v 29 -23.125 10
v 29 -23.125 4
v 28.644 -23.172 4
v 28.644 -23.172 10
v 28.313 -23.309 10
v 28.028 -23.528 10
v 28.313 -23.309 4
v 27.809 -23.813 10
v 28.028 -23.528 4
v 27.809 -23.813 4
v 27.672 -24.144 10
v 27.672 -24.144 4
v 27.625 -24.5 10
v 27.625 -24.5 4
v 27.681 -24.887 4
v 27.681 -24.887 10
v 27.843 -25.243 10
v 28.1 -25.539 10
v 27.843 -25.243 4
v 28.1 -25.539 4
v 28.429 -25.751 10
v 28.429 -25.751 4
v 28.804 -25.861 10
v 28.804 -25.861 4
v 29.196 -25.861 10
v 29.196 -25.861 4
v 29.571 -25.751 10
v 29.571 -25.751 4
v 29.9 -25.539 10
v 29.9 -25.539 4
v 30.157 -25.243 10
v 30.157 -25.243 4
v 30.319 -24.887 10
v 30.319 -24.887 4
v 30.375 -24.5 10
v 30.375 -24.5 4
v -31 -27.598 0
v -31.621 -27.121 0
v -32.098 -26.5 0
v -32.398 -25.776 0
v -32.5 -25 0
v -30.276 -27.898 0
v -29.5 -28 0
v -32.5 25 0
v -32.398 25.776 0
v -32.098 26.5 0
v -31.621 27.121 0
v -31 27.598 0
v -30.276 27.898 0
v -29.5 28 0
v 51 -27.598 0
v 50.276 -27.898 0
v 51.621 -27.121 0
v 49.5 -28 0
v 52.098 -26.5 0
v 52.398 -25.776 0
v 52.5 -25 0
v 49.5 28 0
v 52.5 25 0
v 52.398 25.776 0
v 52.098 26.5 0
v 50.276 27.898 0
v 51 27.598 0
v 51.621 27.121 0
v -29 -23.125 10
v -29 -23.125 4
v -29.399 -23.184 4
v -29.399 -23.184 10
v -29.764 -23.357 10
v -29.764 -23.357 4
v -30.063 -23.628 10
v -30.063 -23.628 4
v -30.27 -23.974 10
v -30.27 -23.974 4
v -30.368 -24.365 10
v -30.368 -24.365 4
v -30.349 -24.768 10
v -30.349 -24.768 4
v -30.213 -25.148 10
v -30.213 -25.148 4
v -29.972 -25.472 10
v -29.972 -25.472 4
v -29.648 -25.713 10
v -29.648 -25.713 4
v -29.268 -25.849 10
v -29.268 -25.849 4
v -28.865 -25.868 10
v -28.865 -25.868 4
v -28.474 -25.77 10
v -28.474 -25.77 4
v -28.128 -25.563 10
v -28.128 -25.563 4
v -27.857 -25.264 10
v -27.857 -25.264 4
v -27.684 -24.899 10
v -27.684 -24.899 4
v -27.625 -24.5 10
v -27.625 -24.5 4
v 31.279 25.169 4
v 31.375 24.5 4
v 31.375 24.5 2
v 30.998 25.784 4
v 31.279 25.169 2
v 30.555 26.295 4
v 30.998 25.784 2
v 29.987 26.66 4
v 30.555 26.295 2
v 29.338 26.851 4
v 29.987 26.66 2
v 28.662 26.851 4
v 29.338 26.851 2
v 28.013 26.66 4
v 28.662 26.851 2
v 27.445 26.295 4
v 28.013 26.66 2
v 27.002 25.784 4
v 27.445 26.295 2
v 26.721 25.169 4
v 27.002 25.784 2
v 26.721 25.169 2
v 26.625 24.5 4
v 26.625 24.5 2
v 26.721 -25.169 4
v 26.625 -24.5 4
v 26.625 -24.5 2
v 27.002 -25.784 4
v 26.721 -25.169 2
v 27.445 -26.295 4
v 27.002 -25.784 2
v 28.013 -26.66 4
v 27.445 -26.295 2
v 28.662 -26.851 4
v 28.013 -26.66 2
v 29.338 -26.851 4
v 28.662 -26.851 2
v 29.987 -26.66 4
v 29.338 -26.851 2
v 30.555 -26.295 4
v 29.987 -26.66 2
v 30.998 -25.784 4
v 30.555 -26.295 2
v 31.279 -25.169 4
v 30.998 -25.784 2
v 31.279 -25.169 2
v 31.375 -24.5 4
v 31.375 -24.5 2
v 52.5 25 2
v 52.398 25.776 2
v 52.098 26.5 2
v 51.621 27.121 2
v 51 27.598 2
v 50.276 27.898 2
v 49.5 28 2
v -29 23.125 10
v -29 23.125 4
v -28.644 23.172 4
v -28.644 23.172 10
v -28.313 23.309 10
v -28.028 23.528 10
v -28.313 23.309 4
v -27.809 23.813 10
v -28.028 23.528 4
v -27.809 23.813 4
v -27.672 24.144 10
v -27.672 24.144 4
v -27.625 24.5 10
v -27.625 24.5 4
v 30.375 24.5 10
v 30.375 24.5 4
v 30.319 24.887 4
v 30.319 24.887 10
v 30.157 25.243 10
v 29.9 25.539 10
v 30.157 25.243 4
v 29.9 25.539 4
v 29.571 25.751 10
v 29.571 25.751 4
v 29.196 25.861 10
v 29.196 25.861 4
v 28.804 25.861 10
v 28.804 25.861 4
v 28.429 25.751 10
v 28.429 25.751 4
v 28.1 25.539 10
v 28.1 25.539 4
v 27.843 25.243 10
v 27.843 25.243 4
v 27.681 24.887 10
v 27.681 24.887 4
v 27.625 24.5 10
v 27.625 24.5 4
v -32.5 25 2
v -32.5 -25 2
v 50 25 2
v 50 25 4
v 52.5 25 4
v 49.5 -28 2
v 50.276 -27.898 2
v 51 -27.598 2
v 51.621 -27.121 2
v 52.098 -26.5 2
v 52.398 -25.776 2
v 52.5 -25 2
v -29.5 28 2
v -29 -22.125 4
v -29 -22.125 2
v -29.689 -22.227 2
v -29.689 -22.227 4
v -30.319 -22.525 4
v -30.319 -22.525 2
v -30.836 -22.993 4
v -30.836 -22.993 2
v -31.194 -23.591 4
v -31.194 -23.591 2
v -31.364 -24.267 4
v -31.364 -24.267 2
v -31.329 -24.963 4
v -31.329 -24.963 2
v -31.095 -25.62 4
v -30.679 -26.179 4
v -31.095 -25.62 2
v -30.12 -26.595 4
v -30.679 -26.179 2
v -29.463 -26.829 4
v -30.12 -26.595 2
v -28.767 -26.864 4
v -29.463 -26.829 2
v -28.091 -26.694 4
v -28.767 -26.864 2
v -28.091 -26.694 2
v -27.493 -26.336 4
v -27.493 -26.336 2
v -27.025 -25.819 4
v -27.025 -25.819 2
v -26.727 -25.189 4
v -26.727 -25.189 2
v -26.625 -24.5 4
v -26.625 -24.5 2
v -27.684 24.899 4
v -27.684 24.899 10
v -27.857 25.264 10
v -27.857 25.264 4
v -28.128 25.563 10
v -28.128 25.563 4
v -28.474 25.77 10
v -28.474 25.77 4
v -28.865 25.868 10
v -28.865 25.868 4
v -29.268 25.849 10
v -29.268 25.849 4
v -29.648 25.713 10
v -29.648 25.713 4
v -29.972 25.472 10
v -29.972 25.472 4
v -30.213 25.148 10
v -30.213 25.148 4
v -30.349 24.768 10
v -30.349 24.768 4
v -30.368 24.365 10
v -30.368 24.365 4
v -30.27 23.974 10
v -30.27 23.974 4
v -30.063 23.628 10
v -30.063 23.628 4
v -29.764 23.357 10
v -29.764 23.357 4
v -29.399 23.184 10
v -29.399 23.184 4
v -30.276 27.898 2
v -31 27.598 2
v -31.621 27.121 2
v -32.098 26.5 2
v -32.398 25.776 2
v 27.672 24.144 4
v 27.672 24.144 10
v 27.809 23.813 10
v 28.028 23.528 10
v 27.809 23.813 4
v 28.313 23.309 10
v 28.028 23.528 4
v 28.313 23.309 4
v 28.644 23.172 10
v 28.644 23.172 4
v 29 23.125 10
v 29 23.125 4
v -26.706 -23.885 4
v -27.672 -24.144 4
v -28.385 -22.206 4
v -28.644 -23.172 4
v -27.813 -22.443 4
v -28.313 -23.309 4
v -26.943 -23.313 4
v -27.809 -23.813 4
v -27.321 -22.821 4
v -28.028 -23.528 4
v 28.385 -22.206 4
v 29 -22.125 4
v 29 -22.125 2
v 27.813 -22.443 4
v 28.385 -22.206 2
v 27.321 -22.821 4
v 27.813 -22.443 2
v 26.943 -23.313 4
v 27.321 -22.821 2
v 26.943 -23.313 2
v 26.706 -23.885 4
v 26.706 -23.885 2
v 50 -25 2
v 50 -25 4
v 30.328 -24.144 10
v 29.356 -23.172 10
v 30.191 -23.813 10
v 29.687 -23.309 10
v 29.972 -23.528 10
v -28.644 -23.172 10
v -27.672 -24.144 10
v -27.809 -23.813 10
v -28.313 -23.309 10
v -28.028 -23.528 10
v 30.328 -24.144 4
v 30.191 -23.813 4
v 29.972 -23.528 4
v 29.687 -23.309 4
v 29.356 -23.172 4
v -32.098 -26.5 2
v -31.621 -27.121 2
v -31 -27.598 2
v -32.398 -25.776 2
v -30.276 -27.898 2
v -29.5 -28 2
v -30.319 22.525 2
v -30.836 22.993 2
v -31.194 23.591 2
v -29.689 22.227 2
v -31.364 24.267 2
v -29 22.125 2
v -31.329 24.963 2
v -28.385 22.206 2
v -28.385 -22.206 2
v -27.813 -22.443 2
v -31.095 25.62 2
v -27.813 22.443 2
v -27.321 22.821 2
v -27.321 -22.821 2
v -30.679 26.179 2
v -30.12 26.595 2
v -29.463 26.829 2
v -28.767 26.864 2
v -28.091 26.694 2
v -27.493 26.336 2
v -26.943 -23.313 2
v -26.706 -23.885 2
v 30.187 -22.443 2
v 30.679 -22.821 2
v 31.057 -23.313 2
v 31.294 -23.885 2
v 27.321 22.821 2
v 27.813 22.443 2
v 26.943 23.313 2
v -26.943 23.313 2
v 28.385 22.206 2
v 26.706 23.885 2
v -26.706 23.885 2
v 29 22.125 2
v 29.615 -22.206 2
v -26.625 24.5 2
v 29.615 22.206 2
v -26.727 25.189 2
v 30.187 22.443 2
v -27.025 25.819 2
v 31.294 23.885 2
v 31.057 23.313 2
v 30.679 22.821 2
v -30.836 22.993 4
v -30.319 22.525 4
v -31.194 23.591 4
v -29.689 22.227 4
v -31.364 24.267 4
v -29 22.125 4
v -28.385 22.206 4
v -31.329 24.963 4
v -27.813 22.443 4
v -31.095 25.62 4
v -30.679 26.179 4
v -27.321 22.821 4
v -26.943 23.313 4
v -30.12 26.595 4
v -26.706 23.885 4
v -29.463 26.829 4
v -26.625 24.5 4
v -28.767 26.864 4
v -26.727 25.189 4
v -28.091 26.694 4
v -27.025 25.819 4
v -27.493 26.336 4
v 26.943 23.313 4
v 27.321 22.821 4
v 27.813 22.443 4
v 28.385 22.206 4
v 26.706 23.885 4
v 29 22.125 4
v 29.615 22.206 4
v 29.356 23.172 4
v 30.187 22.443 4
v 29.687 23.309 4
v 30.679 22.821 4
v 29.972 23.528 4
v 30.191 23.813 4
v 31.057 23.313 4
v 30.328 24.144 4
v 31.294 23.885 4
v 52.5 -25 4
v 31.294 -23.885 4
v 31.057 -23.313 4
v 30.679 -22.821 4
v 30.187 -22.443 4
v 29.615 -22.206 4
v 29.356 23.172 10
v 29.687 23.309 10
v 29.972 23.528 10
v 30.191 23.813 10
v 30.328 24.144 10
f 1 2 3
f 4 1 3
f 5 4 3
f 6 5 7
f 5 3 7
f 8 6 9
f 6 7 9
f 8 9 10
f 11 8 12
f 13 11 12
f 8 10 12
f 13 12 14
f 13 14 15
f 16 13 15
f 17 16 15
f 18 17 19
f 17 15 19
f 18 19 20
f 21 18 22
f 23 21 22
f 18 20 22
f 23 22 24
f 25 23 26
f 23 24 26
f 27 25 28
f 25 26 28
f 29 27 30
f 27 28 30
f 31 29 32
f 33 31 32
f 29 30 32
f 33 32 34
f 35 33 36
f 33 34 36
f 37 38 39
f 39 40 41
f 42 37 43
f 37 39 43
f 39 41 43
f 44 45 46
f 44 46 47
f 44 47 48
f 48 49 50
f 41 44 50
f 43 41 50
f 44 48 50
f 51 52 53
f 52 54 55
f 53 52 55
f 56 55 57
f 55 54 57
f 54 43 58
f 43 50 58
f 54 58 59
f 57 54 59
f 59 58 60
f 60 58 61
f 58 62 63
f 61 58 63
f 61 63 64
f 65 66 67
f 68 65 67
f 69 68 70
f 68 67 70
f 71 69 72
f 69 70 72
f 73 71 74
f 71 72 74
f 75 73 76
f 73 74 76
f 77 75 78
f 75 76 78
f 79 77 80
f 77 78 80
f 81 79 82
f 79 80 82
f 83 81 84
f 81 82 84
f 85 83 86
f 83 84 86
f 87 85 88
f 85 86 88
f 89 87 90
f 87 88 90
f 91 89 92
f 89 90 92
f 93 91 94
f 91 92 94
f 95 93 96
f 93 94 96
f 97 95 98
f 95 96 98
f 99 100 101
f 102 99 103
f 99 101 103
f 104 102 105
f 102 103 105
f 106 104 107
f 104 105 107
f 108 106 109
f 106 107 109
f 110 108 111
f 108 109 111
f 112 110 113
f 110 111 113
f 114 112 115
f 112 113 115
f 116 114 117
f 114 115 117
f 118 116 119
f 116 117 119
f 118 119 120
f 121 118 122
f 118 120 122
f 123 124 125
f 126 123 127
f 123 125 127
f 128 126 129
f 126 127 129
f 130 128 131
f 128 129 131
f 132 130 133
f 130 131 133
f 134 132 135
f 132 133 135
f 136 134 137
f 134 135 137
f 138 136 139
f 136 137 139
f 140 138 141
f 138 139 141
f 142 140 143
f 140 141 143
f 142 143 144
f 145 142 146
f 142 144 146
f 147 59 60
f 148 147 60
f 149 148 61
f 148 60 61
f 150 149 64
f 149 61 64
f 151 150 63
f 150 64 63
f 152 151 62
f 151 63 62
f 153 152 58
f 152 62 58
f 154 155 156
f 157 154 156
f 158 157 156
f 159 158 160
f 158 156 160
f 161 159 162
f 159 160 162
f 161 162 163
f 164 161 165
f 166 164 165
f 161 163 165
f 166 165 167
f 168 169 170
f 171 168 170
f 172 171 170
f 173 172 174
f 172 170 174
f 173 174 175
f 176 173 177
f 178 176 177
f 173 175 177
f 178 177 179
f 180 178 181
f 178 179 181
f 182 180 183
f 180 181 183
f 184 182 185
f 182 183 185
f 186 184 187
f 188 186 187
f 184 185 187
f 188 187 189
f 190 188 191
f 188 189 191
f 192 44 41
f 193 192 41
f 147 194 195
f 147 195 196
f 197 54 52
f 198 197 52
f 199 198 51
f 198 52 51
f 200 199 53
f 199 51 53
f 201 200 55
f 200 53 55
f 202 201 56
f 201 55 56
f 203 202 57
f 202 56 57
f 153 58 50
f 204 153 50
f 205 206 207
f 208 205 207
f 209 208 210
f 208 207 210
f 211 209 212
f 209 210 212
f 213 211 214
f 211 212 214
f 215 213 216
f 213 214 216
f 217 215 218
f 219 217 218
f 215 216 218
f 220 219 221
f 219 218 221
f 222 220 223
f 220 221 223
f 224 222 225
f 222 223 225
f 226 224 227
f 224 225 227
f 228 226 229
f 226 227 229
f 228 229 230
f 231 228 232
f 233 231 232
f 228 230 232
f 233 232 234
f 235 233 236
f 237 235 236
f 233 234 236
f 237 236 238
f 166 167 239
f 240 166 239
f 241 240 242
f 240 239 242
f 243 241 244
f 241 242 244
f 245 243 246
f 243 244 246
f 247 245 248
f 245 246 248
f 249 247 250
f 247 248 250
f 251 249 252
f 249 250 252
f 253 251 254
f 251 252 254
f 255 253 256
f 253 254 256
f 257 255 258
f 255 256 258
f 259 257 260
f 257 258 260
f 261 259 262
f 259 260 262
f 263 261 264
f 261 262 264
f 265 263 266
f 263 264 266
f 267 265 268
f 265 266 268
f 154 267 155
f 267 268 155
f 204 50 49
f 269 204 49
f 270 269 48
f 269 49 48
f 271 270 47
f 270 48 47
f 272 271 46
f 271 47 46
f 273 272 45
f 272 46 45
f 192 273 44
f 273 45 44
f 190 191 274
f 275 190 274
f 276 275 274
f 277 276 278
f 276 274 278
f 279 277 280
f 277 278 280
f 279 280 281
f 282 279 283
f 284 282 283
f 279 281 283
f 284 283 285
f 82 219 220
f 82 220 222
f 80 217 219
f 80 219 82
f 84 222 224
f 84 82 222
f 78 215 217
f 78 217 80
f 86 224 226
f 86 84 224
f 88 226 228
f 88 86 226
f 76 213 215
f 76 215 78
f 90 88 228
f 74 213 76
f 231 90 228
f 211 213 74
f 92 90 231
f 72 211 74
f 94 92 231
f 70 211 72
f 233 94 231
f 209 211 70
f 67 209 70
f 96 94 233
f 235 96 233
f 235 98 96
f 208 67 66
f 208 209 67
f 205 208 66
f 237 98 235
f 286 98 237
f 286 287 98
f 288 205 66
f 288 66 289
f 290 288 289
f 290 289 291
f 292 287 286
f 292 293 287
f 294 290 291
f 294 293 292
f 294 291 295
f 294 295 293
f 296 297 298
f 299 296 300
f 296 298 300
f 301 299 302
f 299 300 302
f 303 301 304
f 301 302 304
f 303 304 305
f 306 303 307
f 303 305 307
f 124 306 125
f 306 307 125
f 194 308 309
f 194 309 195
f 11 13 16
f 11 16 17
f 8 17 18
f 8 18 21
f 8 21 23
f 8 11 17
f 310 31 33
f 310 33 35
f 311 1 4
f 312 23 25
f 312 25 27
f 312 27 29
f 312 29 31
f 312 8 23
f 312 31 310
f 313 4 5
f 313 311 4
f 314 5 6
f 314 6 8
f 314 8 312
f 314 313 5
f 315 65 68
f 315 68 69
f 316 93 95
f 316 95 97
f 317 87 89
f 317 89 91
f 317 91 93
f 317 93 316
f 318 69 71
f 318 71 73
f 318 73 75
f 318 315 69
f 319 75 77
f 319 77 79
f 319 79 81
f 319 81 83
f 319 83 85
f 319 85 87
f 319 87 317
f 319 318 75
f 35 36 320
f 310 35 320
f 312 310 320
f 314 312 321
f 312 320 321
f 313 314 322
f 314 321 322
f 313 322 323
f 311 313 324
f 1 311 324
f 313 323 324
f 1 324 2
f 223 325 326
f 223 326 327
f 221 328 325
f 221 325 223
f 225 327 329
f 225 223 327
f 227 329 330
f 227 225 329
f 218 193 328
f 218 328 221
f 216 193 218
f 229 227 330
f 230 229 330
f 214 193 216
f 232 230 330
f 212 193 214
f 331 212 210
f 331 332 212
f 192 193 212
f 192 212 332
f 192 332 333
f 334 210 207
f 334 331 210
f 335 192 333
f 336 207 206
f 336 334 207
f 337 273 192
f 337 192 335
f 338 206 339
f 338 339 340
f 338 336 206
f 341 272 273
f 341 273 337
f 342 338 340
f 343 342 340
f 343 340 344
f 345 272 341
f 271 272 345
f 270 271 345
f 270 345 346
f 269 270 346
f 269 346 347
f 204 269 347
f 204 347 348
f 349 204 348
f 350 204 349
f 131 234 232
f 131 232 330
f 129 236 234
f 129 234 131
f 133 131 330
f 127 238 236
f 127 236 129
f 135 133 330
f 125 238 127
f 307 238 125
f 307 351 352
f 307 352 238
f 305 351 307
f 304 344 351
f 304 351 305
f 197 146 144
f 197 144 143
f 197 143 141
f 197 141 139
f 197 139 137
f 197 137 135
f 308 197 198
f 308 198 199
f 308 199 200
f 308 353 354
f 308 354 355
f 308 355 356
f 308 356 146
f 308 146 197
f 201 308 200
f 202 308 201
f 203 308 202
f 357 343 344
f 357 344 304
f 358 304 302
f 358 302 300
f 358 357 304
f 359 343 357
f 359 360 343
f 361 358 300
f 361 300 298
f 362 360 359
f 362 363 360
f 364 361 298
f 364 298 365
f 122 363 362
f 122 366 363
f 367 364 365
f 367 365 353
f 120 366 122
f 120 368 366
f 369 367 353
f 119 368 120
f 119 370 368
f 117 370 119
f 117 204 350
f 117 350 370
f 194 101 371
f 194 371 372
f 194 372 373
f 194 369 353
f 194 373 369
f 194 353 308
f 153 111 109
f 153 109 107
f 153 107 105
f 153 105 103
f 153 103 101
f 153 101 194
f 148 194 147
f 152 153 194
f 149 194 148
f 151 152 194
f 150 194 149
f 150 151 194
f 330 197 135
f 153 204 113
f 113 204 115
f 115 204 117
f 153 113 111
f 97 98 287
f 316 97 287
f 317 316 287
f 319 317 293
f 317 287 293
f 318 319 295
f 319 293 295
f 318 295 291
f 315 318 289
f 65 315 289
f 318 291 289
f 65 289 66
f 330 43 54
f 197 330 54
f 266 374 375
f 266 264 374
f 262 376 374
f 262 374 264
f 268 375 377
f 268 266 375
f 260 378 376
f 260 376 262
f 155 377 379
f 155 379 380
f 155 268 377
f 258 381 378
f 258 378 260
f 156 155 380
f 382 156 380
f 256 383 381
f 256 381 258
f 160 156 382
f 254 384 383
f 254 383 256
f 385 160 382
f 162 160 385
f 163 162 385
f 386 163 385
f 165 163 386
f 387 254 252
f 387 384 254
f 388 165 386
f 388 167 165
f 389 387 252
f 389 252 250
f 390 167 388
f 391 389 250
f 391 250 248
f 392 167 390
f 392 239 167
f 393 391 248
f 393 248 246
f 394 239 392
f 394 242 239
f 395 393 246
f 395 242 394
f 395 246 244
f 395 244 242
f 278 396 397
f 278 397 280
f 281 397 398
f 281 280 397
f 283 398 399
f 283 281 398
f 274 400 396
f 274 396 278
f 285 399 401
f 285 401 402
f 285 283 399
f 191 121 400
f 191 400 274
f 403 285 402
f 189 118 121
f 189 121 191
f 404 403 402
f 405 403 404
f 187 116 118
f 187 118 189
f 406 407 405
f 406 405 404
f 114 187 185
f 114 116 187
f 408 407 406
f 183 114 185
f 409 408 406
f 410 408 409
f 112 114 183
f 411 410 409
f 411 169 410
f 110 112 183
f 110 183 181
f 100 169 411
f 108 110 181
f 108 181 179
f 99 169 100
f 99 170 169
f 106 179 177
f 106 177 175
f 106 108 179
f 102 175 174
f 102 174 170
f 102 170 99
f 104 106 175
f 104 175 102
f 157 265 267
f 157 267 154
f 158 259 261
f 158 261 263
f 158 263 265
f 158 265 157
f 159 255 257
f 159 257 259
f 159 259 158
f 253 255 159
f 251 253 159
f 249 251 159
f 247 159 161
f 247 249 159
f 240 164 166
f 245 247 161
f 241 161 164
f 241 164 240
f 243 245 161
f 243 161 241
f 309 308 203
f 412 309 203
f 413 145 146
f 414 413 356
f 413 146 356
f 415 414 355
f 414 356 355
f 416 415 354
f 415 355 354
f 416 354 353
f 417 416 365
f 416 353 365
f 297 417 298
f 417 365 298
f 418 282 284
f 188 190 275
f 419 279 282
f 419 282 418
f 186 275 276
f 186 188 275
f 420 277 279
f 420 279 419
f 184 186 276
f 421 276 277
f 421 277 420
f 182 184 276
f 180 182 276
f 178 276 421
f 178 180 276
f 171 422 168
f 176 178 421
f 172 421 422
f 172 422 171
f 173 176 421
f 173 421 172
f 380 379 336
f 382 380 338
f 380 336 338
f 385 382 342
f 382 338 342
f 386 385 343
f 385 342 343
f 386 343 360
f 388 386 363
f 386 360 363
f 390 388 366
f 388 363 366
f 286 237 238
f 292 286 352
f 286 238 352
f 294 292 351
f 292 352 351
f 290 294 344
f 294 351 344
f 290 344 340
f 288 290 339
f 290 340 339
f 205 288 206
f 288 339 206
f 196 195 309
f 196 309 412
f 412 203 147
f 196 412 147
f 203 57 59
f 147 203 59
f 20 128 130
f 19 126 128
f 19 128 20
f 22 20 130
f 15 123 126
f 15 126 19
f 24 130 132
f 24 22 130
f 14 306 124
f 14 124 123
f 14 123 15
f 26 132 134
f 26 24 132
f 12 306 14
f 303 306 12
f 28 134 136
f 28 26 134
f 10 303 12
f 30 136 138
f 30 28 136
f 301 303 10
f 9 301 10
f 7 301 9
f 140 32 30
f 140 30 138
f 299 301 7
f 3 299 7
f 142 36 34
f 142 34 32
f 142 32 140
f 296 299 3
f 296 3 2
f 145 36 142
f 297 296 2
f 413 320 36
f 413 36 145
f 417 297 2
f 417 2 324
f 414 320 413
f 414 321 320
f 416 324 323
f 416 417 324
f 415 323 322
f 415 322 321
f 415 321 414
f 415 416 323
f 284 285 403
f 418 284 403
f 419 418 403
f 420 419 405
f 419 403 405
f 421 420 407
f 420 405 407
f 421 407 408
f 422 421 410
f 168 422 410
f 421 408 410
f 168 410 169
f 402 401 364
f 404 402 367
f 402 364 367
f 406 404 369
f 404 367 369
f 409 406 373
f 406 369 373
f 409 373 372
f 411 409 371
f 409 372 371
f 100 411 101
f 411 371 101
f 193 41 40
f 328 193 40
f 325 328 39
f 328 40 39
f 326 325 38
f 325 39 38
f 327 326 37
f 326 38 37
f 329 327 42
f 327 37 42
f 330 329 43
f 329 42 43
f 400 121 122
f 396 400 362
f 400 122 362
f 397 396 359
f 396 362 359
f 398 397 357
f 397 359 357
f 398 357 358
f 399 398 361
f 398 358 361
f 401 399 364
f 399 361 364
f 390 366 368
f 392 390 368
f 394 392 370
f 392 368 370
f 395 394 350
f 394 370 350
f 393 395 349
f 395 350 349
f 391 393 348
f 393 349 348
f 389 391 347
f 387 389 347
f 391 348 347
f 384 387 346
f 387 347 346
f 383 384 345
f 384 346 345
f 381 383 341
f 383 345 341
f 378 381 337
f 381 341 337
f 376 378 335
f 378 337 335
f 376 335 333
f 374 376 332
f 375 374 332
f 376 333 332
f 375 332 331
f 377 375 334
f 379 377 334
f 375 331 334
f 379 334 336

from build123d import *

# Parameters (mm, degrees)
F0_W     = 2.5
F0_H     = 50
F1_DEPTH = 2
F2_DEPTH = 4
F3_DEPTH = 4
F4_DEPTH = 10


with BuildPart() as f1:
    # F0 (on Top) → F1 (new body)
    with BuildSketch(Plane.XY):
        with BuildLine():
            ThreePointArc((-32.5, -25), (-31.6213203436, -27.1213203436), (-29.5, -28))
            Line((-29.5, -28), (-29.0716141462, -28))
            Line((-29.0716141462, -28), (49.5, -28))
            ThreePointArc((49.5, -28), (51.6213203436, -27.1213203436), (52.5, -25))
            Line((52.5, -25), (50, -25))
            Line((50, -25), (50, 25))
            Line((50, 25), (52.5, 25))
            ThreePointArc((52.5, 25), (51.6213203436, 27.1213203436), (49.5, 28))
            Line((49.5, 28), (-29.5, 28))
            ThreePointArc((-29.5, 28), (-31.6213203436, 27.1213203436), (-32.5, 25))
            Line((-32.5, 25), (-32.5, -24.5))
            Line((-32.5, -24.5), (-32.5, -25))
        make_face()
        with BuildLine():
            ThreePointArc((-29, 22.125), (-30.6793786053, 26.1793786053), (-26.625, 24.5))
            Line((-26.625, 24.5), (26.625, 24.5))
            ThreePointArc((26.625, 24.5), (29, 26.875), (31.375, 24.5))
            ThreePointArc((31.375, 24.5), (30.6793786053, 22.8206213947), (29, 22.125))
            Line((29, 22.125), (29, -22.125))
            ThreePointArc((29, -22.125), (30.6793786053, -22.8206213947), (31.375, -24.5))
            ThreePointArc((31.375, -24.5), (29, -26.875), (26.625, -24.5))
            Line((26.625, -24.5), (-26.625, -24.5))
            ThreePointArc((-26.625, -24.5), (-30.6793786053, -26.1793786053), (-29, -22.125))
            Line((-29, -22.125), (-29, 22.125))
        make_face(mode=Mode.SUBTRACT)
        with BuildLine():
            Line((26.625, 24.5), (-26.625, 24.5))
            ThreePointArc((-26.625, 24.5), (-27.3206213947, 22.8206213947), (-29, 22.125))
            Line((-29, 22.125), (-29, -22.125))
            ThreePointArc((-29, -22.125), (-27.3206213947, -22.8206213947), (-26.625, -24.5))
            Line((-26.625, -24.5), (26.625, -24.5))
            ThreePointArc((26.625, -24.5), (27.3206213947, -22.8206213947), (29, -22.125))
            Line((29, -22.125), (29, 22.125))
            ThreePointArc((29, 22.125), (27.3206213947, 22.8206213947), (26.625, 24.5))
        make_face()
        with BuildLine():
            Line((-29, 23.125), (-29, 24.5))
            Line((-29, 24.5), (-27.625, 24.5))
            ThreePointArc((-27.625, 24.5), (-29.9722718241, 25.4722718241), (-29, 23.125))
        make_face()
        with BuildLine():
            ThreePointArc((-29, 23.125), (-29.9722718241, 25.4722718241), (-27.625, 24.5))
            Line((-27.625, 24.5), (-26.625, 24.5))
            ThreePointArc((-26.625, 24.5), (-30.6793786053, 26.1793786053), (-29, 22.125))
            Line((-29, 22.125), (-29, 23.125))
        make_face()
        with BuildLine():
            Line((-27.625, 24.5), (-29, 24.5))
            Line((-29, 24.5), (-29, 23.125))
            ThreePointArc((-29, 23.125), (-28.0277281759, 23.5277281759), (-27.625, 24.5))
        make_face()
        with BuildLine():
            Line((-26.625, 24.5), (-27.625, 24.5))
            ThreePointArc((-27.625, 24.5), (-28.0277281759, 23.5277281759), (-29, 23.125))
            Line((-29, 23.125), (-29, 22.125))
            ThreePointArc((-29, 22.125), (-27.3206213947, 22.8206213947), (-26.625, 24.5))
        make_face()
        with BuildLine():
            Line((-29, -24.5), (-29, -23.125))
            ThreePointArc((-29, -23.125), (-29.9722718241, -25.4722718241), (-27.625, -24.5))
            Line((-27.625, -24.5), (-29, -24.5))
        make_face()
        with BuildLine():
            Line((-29, -23.125), (-29, -22.125))
            ThreePointArc((-29, -22.125), (-30.6793786053, -26.1793786053), (-26.625, -24.5))
            Line((-26.625, -24.5), (-27.625, -24.5))
            ThreePointArc((-27.625, -24.5), (-29.9722718241, -25.4722718241), (-29, -23.125))
        make_face()
        with BuildLine():
            ThreePointArc((-27.625, -24.5), (-28.0277281759, -23.5277281759), (-29, -23.125))
            Line((-29, -23.125), (-29, -24.5))
            Line((-29, -24.5), (-27.625, -24.5))
        make_face()
        with BuildLine():
            ThreePointArc((-26.625, -24.5), (-27.3206213947, -22.8206213947), (-29, -22.125))
            Line((-29, -22.125), (-29, -23.125))
            ThreePointArc((-29, -23.125), (-28.0277281759, -23.5277281759), (-27.625, -24.5))
            Line((-27.625, -24.5), (-26.625, -24.5))
        make_face()
        with BuildLine():
            Line((29, -23.125), (29, -22.125))
            ThreePointArc((29, -22.125), (27.3206213947, -22.8206213947), (26.625, -24.5))
            Line((26.625, -24.5), (27.625, -24.5))
            ThreePointArc((27.625, -24.5), (28.0277281759, -23.5277281759), (29, -23.125))
        make_face()
        with BuildLine():
            Line((29, -24.5), (29, -23.125))
            ThreePointArc((29, -23.125), (28.0277281759, -23.5277281759), (27.625, -24.5))
            Line((27.625, -24.5), (29, -24.5))
        make_face()
        with BuildLine():
            ThreePointArc((31.375, -24.5), (30.6793786053, -22.8206213947), (29, -22.125))
            Line((29, -22.125), (29, -23.125))
            ThreePointArc((29, -23.125), (29.9722718241, -23.5277281759), (30.375, -24.5))
            ThreePointArc((30.375, -24.5), (29, -25.875), (27.625, -24.5))
            Line((27.625, -24.5), (26.625, -24.5))
            ThreePointArc((26.625, -24.5), (29, -26.875), (31.375, -24.5))
        make_face()
        with BuildLine():
            ThreePointArc((30.375, -24.5), (29.9722718241, -23.5277281759), (29, -23.125))
            Line((29, -23.125), (29, -24.5))
            Line((29, -24.5), (27.625, -24.5))
            ThreePointArc((27.625, -24.5), (29, -25.875), (30.375, -24.5))
        make_face()
        with BuildLine():
            ThreePointArc((31.375, 24.5), (29, 26.875), (26.625, 24.5))
            Line((26.625, 24.5), (27.625, 24.5))
            ThreePointArc((27.625, 24.5), (29, 25.875), (30.375, 24.5))
            ThreePointArc((30.375, 24.5), (29.9722718241, 23.5277281759), (29, 23.125))
            Line((29, 23.125), (29, 22.125))
            ThreePointArc((29, 22.125), (30.6793786053, 22.8206213947), (31.375, 24.5))
        make_face()
        with BuildLine():
            ThreePointArc((30.375, 24.5), (29, 25.875), (27.625, 24.5))
            Line((27.625, 24.5), (29, 24.5))
            Line((29, 24.5), (29, 23.125))
            ThreePointArc((29, 23.125), (29.9722718241, 23.5277281759), (30.375, 24.5))
        make_face()
        with BuildLine():
            Line((29, 24.5), (27.625, 24.5))
            ThreePointArc((27.625, 24.5), (28.0277281759, 23.5277281759), (29, 23.125))
            Line((29, 23.125), (29, 24.5))
        make_face()
        with BuildLine():
            Line((27.625, 24.5), (26.625, 24.5))
            ThreePointArc((26.625, 24.5), (27.3206213947, 22.8206213947), (29, 22.125))
            Line((29, 22.125), (29, 23.125))
            ThreePointArc((29, 23.125), (28.0277281759, 23.5277281759), (27.625, 24.5))
        make_face()
        with Locations((51.25, 0)):
            Rectangle(F0_W, F0_H)
    extrude(amount=F1_DEPTH)

    # F0 (on Top) → F2 (join)
    with BuildSketch(Plane.XY):
        with Locations((51.25, 0)):
            Rectangle(F0_W, F0_H)
    extrude(amount=F2_DEPTH)

    # F0 (on Top) → F3 (join)
    with BuildSketch(Plane.XY):
        with BuildLine():
            Line((-29, -23.125), (-29, -22.125))
            ThreePointArc((-29, -22.125), (-30.6793786053, -26.1793786053), (-26.625, -24.5))
            Line((-26.625, -24.5), (-27.625, -24.5))
            ThreePointArc((-27.625, -24.5), (-29.9722718241, -25.4722718241), (-29, -23.125))
        make_face()
        with BuildLine():
            ThreePointArc((-26.625, -24.5), (-27.3206213947, -22.8206213947), (-29, -22.125))
            Line((-29, -22.125), (-29, -23.125))
            ThreePointArc((-29, -23.125), (-28.0277281759, -23.5277281759), (-27.625, -24.5))
            Line((-27.625, -24.5), (-26.625, -24.5))
        make_face()
        with BuildLine():
            Line((29, -23.125), (29, -22.125))
            ThreePointArc((29, -22.125), (27.3206213947, -22.8206213947), (26.625, -24.5))
            Line((26.625, -24.5), (27.625, -24.5))
            ThreePointArc((27.625, -24.5), (28.0277281759, -23.5277281759), (29, -23.125))
        make_face()
        with BuildLine():
            ThreePointArc((31.375, -24.5), (30.6793786053, -22.8206213947), (29, -22.125))
            Line((29, -22.125), (29, -23.125))
            ThreePointArc((29, -23.125), (29.9722718241, -23.5277281759), (30.375, -24.5))
            ThreePointArc((30.375, -24.5), (29, -25.875), (27.625, -24.5))
            Line((27.625, -24.5), (26.625, -24.5))
            ThreePointArc((26.625, -24.5), (29, -26.875), (31.375, -24.5))
        make_face()
        with BuildLine():
            ThreePointArc((31.375, 24.5), (29, 26.875), (26.625, 24.5))
            Line((26.625, 24.5), (27.625, 24.5))
            ThreePointArc((27.625, 24.5), (29, 25.875), (30.375, 24.5))
            ThreePointArc((30.375, 24.5), (29.9722718241, 23.5277281759), (29, 23.125))
            Line((29, 23.125), (29, 22.125))
            ThreePointArc((29, 22.125), (30.6793786053, 22.8206213947), (31.375, 24.5))
        make_face()
        with BuildLine():
            Line((27.625, 24.5), (26.625, 24.5))
            ThreePointArc((26.625, 24.5), (27.3206213947, 22.8206213947), (29, 22.125))
            Line((29, 22.125), (29, 23.125))
            ThreePointArc((29, 23.125), (28.0277281759, 23.5277281759), (27.625, 24.5))
        make_face()
        with BuildLine():
            ThreePointArc((-29, 23.125), (-29.9722718241, 25.4722718241), (-27.625, 24.5))
            Line((-27.625, 24.5), (-26.625, 24.5))
            ThreePointArc((-26.625, 24.5), (-30.6793786053, 26.1793786053), (-29, 22.125))
            Line((-29, 22.125), (-29, 23.125))
        make_face()
        with BuildLine():
            Line((-26.625, 24.5), (-27.625, 24.5))
            ThreePointArc((-27.625, 24.5), (-28.0277281759, 23.5277281759), (-29, 23.125))
            Line((-29, 23.125), (-29, 22.125))
            ThreePointArc((-29, 22.125), (-27.3206213947, 22.8206213947), (-26.625, 24.5))
        make_face()
    extrude(amount=F3_DEPTH)

    # F0 (on Top) → F4 (join)
    with BuildSketch(Plane.XY):
        with BuildLine():
            ThreePointArc((30.375, -24.5), (29.9722718241, -23.5277281759), (29, -23.125))
            Line((29, -23.125), (29, -24.5))
            Line((29, -24.5), (27.625, -24.5))
            ThreePointArc((27.625, -24.5), (29, -25.875), (30.375, -24.5))
        make_face()
        with BuildLine():
            Line((29, -24.5), (29, -23.125))
            ThreePointArc((29, -23.125), (28.0277281759, -23.5277281759), (27.625, -24.5))
            Line((27.625, -24.5), (29, -24.5))
        make_face()
        with BuildLine():
            Line((-29, -24.5), (-29, -23.125))
            ThreePointArc((-29, -23.125), (-29.9722718241, -25.4722718241), (-27.625, -24.5))
            Line((-27.625, -24.5), (-29, -24.5))
        make_face()
        with BuildLine():
            ThreePointArc((-27.625, -24.5), (-28.0277281759, -23.5277281759), (-29, -23.125))
            Line((-29, -23.125), (-29, -24.5))
            Line((-29, -24.5), (-27.625, -24.5))
        make_face()
        with BuildLine():
            Line((-29, 23.125), (-29, 24.5))
            Line((-29, 24.5), (-27.625, 24.5))
            ThreePointArc((-27.625, 24.5), (-29.9722718241, 25.4722718241), (-29, 23.125))
        make_face()
        with BuildLine():
            Line((-27.625, 24.5), (-29, 24.5))
            Line((-29, 24.5), (-29, 23.125))
            ThreePointArc((-29, 23.125), (-28.0277281759, 23.5277281759), (-27.625, 24.5))
        make_face()
        with BuildLine():
            ThreePointArc((30.375, 24.5), (29, 25.875), (27.625, 24.5))
            Line((27.625, 24.5), (29, 24.5))
            Line((29, 24.5), (29, 23.125))
            ThreePointArc((29, 23.125), (29.9722718241, 23.5277281759), (30.375, 24.5))
        make_face()
        with BuildLine():
            Line((29, 24.5), (27.625, 24.5))
            ThreePointArc((27.625, 24.5), (28.0277281759, 23.5277281759), (29, 23.125))
            Line((29, 23.125), (29, 24.5))
        make_face()
    extrude(amount=F4_DEPTH)


solid = f1.part
